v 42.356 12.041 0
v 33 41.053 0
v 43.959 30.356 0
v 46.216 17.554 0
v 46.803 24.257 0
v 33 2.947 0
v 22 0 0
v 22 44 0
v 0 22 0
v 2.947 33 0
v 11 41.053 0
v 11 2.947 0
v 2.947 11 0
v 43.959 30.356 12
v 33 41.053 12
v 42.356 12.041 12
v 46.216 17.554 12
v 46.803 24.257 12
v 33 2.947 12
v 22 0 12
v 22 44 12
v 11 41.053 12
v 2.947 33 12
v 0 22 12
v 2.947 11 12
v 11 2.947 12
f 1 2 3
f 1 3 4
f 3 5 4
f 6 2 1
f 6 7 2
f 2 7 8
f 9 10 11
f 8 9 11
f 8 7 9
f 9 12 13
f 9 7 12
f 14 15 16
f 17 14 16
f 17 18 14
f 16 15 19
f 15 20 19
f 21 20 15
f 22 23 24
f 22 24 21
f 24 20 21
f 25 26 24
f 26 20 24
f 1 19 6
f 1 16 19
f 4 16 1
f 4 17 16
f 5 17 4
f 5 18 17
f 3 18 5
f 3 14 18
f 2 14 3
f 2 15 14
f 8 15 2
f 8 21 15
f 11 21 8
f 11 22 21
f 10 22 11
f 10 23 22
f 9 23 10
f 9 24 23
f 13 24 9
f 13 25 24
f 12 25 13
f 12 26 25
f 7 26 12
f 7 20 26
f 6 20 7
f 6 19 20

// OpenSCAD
$fn = 32;

// ----------------------------------------------------------------------
// Eccentric disc: step, 12 mm thick
// ----------------------------------------------------------------------

// --- parameters (mm) ---
profile_height = 12;      // extrusion height
profile_points = 13;      // points of the closed outline

profile = [[0, 22], [2.947, 11], [11, 2.947], [22, 0], [33, 2.947], [42.356, 12.041], [46.216, 17.554], [46.803, 24.257], [43.959, 30.356], [33, 41.053], [22, 44], [11, 41.053], [2.947, 33]];  // single closed polygon, 13 points, counter clockwise

// --- the one profile operation ---
linear_extrude(height = profile_height) polygon(points = profile);
